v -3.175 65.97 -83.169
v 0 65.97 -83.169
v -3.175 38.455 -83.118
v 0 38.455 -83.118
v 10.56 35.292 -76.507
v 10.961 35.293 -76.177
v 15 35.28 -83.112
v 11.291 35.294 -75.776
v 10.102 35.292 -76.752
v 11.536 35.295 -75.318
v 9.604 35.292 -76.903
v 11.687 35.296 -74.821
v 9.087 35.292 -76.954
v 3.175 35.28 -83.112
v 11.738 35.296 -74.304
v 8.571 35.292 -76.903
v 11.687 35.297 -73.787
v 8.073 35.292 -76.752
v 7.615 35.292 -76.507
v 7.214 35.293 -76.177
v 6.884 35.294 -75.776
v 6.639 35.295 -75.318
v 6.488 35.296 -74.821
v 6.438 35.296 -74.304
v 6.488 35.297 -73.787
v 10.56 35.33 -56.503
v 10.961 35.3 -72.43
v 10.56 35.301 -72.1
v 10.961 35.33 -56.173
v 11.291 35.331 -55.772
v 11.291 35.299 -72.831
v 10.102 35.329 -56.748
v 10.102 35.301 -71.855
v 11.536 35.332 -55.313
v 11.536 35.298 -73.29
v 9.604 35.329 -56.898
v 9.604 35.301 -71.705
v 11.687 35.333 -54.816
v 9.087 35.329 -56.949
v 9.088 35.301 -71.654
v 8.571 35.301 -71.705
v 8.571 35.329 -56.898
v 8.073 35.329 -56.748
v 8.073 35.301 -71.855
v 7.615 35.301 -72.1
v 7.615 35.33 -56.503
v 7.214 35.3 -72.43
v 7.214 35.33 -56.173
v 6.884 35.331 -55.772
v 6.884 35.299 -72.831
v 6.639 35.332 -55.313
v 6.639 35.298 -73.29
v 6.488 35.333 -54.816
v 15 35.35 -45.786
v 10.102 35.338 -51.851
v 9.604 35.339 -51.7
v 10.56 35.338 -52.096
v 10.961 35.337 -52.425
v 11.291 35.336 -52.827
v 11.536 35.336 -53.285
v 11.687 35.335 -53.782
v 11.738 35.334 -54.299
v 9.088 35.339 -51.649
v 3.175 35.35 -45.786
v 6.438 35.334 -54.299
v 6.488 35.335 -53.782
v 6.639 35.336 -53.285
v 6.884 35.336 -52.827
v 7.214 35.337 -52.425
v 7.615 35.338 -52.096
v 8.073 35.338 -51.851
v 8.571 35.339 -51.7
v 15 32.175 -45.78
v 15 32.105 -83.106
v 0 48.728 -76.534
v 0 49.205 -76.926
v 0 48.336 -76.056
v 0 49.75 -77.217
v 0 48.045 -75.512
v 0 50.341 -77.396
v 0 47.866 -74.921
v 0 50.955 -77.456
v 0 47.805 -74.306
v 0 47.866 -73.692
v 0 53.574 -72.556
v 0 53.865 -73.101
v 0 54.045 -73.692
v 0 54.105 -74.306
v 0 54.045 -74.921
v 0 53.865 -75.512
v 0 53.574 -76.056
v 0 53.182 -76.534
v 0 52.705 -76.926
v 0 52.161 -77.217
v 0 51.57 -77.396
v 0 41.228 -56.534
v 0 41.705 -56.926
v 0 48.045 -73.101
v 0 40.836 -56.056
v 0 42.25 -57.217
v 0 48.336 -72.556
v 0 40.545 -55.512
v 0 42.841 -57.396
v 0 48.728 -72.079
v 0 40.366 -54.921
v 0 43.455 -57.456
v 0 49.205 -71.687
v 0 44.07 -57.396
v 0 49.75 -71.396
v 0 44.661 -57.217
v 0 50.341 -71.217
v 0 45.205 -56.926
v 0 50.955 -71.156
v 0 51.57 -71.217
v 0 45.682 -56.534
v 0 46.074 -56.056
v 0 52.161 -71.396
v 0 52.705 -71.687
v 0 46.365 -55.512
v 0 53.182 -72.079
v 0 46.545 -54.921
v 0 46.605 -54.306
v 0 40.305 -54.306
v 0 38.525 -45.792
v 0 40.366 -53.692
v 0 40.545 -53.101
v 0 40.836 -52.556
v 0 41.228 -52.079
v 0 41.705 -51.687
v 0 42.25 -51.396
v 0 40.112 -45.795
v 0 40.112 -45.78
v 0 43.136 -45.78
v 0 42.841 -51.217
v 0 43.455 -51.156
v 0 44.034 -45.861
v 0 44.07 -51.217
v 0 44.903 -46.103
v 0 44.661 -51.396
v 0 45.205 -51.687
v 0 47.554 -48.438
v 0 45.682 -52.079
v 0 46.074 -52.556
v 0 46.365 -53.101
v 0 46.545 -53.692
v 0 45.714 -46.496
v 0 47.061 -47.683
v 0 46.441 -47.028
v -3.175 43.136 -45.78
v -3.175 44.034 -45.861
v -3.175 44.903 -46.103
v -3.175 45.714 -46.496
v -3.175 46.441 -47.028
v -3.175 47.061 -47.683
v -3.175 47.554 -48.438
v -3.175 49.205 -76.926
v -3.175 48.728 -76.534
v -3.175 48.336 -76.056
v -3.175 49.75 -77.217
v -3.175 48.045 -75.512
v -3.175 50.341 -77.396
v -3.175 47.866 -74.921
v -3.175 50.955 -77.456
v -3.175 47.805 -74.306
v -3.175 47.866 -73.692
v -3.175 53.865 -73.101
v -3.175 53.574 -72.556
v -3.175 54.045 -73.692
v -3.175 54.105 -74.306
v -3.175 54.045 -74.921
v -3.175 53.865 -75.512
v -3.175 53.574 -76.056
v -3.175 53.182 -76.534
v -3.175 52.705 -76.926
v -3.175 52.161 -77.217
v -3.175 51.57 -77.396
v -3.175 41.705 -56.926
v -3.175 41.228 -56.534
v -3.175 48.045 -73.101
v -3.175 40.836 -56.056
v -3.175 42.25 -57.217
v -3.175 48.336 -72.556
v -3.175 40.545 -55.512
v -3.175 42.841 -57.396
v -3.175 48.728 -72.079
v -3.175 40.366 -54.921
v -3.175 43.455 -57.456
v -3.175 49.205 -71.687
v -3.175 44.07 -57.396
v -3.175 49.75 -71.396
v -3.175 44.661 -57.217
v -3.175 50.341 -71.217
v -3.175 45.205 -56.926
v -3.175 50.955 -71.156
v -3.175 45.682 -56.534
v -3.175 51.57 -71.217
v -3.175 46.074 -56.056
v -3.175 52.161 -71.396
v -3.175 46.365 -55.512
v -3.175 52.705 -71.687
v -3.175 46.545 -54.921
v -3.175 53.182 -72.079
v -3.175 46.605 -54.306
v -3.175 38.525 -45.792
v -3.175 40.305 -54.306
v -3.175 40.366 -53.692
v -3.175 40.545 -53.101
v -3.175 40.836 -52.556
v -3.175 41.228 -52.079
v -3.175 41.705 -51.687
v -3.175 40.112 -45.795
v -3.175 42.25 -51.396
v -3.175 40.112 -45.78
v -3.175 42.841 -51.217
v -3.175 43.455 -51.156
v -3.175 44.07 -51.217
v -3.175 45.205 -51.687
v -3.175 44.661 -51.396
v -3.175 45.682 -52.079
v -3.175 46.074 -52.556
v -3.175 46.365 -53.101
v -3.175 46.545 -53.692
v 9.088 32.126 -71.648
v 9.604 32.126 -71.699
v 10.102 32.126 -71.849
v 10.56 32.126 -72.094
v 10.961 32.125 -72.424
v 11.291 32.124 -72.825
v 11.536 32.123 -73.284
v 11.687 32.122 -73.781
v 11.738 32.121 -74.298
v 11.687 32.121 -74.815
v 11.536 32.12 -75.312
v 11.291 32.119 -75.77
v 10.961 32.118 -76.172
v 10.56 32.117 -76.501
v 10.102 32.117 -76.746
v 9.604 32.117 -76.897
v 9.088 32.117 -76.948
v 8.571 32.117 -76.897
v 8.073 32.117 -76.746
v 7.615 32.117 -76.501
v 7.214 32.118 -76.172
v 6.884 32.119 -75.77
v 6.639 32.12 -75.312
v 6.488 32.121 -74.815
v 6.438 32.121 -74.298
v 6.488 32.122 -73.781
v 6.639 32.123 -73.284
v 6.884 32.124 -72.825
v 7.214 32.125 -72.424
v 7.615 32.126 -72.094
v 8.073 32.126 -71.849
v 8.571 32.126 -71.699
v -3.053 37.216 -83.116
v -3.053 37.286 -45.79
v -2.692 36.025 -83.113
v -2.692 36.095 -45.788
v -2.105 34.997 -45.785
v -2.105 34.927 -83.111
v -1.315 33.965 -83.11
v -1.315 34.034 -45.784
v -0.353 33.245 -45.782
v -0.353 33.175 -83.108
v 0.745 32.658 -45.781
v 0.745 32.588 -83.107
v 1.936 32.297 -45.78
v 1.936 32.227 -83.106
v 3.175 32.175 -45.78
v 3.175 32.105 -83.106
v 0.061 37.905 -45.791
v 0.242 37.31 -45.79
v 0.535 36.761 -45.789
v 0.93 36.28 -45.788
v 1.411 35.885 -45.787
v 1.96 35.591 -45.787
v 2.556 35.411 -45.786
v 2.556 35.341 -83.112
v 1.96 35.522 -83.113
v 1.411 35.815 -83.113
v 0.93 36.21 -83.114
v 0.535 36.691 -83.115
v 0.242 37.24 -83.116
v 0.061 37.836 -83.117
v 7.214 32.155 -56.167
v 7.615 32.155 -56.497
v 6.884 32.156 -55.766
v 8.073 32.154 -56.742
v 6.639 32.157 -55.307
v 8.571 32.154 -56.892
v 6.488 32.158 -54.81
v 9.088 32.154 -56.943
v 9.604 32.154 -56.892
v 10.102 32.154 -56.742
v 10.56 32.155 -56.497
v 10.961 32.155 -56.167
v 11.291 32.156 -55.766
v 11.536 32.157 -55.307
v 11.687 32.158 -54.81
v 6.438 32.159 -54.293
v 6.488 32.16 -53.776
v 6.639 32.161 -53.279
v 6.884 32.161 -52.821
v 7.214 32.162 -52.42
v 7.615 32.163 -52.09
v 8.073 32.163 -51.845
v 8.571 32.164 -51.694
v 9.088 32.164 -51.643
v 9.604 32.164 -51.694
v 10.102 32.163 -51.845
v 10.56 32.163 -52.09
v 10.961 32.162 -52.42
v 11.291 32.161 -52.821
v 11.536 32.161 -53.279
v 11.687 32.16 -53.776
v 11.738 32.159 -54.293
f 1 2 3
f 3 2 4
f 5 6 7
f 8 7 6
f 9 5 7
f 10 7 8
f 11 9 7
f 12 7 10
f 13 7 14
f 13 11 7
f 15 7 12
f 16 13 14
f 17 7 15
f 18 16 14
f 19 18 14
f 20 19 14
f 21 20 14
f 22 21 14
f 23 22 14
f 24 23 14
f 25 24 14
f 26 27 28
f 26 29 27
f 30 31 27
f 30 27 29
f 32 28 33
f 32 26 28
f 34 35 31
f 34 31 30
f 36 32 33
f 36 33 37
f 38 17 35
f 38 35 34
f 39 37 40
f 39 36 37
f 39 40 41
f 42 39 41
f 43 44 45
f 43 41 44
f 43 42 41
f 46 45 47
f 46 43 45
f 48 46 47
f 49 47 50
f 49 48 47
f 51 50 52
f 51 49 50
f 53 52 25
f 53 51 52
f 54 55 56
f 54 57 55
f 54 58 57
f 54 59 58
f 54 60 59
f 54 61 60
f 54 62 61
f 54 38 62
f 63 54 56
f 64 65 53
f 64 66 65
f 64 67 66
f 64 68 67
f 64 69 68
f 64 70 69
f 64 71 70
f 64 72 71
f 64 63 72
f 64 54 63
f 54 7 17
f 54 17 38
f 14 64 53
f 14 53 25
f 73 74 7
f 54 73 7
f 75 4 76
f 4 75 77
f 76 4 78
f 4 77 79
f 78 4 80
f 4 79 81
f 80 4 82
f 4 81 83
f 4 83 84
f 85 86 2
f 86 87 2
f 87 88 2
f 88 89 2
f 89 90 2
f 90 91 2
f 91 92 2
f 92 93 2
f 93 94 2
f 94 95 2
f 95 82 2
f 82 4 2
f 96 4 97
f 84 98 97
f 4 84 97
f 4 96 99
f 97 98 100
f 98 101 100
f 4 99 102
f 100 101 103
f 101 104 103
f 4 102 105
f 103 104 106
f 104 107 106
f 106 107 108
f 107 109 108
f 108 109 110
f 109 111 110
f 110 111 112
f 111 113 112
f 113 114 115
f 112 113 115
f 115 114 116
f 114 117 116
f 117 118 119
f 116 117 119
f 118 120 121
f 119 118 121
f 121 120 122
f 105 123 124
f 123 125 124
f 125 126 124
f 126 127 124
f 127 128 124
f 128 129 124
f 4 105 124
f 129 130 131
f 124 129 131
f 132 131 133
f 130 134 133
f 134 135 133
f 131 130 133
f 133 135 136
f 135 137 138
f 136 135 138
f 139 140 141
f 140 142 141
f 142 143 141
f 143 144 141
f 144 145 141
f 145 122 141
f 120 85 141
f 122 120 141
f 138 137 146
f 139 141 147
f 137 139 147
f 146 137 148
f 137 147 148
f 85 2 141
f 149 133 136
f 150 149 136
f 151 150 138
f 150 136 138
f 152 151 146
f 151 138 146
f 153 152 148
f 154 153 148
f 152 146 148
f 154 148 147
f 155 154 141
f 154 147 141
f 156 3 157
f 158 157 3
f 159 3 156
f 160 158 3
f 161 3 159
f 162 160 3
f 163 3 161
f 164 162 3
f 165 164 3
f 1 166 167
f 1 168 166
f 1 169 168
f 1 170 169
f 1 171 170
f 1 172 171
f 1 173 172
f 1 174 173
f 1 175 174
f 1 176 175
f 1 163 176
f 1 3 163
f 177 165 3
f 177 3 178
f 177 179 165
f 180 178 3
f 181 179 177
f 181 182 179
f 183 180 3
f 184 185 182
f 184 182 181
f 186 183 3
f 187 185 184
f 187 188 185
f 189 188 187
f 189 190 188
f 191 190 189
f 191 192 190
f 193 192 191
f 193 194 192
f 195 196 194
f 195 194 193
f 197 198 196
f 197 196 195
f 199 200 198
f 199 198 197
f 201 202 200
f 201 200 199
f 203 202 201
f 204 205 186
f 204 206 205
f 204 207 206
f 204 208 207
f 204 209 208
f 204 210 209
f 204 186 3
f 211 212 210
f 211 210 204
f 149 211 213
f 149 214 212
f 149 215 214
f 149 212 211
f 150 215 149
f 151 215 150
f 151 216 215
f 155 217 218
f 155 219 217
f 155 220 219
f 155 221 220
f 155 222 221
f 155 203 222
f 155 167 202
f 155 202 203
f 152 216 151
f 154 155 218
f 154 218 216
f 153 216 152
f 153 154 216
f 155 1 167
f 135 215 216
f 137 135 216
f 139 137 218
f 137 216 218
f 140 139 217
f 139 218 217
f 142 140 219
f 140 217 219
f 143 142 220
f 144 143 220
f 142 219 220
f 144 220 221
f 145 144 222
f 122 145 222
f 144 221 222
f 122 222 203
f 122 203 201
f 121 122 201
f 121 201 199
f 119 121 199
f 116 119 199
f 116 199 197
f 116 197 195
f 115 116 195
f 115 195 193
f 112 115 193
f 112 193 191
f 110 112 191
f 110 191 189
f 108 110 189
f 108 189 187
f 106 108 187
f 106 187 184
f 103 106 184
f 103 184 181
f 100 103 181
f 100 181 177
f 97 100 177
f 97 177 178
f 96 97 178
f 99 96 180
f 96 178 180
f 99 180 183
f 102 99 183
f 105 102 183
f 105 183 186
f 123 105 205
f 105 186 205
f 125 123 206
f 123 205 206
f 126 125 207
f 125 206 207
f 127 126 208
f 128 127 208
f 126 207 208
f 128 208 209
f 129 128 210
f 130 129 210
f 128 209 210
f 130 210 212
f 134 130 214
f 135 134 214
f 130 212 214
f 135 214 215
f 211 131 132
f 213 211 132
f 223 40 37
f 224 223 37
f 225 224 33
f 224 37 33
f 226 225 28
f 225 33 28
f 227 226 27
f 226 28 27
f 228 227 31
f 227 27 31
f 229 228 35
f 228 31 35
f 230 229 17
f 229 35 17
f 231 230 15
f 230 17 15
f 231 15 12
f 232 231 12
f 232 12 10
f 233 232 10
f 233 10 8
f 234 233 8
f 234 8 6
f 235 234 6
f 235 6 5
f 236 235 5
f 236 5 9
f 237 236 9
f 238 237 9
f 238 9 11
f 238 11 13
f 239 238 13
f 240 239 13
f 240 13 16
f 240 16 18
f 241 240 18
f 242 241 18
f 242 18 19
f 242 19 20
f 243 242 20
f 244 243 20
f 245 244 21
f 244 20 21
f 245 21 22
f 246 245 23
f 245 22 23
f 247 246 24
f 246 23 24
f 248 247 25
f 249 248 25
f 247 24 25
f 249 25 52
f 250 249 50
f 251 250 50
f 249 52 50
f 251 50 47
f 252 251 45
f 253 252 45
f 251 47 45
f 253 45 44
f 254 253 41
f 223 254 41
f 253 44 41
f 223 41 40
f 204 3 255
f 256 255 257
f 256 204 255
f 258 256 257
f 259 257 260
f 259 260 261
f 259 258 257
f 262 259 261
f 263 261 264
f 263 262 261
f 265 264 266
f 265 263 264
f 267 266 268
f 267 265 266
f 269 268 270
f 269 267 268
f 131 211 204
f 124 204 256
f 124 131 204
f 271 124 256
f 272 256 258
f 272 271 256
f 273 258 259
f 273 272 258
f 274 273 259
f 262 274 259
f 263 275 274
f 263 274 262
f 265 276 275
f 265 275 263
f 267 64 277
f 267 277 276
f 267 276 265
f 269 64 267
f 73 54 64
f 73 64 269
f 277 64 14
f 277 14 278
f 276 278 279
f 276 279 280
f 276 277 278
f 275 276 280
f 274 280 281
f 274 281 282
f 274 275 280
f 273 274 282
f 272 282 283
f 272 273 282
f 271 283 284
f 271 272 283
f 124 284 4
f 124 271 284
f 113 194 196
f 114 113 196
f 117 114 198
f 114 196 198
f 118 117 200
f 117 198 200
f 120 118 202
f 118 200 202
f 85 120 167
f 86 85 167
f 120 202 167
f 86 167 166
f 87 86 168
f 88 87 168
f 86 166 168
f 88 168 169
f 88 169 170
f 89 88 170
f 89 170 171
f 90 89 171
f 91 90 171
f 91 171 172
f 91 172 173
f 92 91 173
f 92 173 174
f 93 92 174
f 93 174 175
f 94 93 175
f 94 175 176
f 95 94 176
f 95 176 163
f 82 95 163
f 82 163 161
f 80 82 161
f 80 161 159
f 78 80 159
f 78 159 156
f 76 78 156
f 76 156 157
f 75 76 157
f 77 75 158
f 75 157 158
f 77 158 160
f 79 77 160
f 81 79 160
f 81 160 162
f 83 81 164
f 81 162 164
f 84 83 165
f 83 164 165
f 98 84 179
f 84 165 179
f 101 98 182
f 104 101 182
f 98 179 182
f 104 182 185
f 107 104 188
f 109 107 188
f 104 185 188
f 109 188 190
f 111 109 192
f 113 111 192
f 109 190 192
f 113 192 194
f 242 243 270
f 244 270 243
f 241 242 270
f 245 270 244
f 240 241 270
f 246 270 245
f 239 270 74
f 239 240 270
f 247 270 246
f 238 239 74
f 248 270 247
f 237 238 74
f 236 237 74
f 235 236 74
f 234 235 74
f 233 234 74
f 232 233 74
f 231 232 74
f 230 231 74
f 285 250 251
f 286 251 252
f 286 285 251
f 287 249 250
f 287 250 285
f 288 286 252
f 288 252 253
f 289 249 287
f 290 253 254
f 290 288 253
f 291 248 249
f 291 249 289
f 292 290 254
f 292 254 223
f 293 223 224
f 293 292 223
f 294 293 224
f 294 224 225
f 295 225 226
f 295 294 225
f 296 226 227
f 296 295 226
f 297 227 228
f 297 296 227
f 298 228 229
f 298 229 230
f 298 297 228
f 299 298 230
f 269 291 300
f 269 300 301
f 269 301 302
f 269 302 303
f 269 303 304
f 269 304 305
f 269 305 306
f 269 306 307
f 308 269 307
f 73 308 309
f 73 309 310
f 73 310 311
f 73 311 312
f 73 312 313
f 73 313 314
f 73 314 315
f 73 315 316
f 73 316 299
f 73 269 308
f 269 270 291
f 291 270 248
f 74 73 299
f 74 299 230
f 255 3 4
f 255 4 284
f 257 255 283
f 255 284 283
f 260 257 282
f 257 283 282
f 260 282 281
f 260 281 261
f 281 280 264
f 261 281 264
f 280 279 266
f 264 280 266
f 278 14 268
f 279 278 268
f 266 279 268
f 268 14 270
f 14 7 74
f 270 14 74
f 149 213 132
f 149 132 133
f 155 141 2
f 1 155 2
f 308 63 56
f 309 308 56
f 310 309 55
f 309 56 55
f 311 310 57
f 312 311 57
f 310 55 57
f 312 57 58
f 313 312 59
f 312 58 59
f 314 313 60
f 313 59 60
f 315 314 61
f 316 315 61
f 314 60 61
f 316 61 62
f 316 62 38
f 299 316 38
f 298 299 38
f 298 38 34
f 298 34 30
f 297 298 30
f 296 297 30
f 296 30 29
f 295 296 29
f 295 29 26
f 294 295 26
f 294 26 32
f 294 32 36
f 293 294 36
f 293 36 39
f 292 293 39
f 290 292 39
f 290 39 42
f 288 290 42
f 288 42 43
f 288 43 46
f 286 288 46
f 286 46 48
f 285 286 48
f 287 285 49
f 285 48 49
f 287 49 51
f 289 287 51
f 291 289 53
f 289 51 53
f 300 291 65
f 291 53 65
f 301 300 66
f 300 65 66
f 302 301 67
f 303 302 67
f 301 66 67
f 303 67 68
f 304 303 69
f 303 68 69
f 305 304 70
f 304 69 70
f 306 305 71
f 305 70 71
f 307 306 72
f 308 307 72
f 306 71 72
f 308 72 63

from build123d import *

# Parameters (mm, degrees)
BASE_FLANGE1_DEPTH            = 3.175
EDGE_FLANGE1_STRIP_W          = 19.05
EDGE_FLANGE1_STRIP_H          = 3.175
EDGE_FLANGE1_STRIP_CUT_DEPTH  = 37.325997284
EDGE_FLANGE1_RELIEF_W         = 20.6375
EDGE_FLANGE1_RELIEF_H         = 1.5875
EDGE_FLANGE1_RELIEF_CUT_DEPTH = 3.175
EDGE_FLANGE1_DEPTH            = 37.325997284
SKETCH15_R                    = 2.65
CUT_EXTRUDE2_DEPTH            = 10
SKETCH19_R                    = 3.15
CUT_EXTRUDE4_DEPTH            = 10


# Sheet-metal steps are written as plain solids
with BuildPart() as part:
    # Sketch3 → Base-Flange1 (new body)
    with BuildSketch(Plane(origin=(0, 0, 0), x_dir=(0, 0, -1), z_dir=(1, 0, 0))):
        with BuildLine():
            Line((83.106142408, 32.105064535), (45.780209905, 32.174606262))
            Line((45.780209905, 32.174606262), (45.780209905, 43.136168925))
            ThreePointArc((45.780209905, 43.136168925), (46.495831721, 45.713784796), (48.437851335, 47.553561406))
            Line((48.437851335, 47.553561406), (83.169236275, 65.970162941))
            Line((83.169236275, 65.970162941), (83.106142408, 32.105064535))
        make_face()
    extrude(amount=-BASE_FLANGE1_DEPTH)

    # Edge-Flange1 strip (across the edge) → Edge-Flange1 strip cut (cut)
    with BuildSketch(Plane(origin=(0, 32.174606262, -45.780209905), x_dir=(3.4914813388431334e-15, 0.999998264444559, -0.001863090945206598), z_dir=(0, -0.001863090945206598, -0.999998264444559))):
        with Locations((-3.175, -1.5875)):
            Rectangle(EDGE_FLANGE1_STRIP_W, EDGE_FLANGE1_STRIP_H)
    extrude(amount=EDGE_FLANGE1_STRIP_CUT_DEPTH, mode=Mode.SUBTRACT)

    # Edge-Flange1 relief (on the sheet) → Edge-Flange1 relief cut (cut)
    with BuildSketch(Plane(origin=(0, 38.524595242, -45.792040532), x_dir=(6.982962677686267e-15, 0.999998264444559, -0.001863090945206598), z_dir=(1, 0, 0))):
        with Locations((-8.73125, 0.79375)):
            Rectangle(EDGE_FLANGE1_RELIEF_W, EDGE_FLANGE1_RELIEF_H)
    extrude(amount=-EDGE_FLANGE1_RELIEF_CUT_DEPTH, mode=Mode.SUBTRACT)

    # Edge-Flange1 section (across the edge) → Edge-Flange1 (add)
    with BuildSketch(Plane(origin=(0, 32.174606262, -45.780209905), x_dir=(3.4914813388431334e-15, 0.999998264444559, -0.001863090945206598), z_dir=(0, -0.001863090945206598, -0.999998264444559))):
        with BuildLine():
            Line((0, 3.175), (0, 15))
            Line((0, 15), (3.175, 15))
            Line((3.175, 15), (3.175, 3.175))
            ThreePointArc((3.175, 3.175), (4.10493597, 0.92993597), (6.35, 0))
            Line((6.35, 0), (6.35, -3.175))
            ThreePointArc((6.35, -3.175), (1.859871939, -1.315128061), (0, 3.175))
        make_face()
    extrude(amount=EDGE_FLANGE1_DEPTH)

    # Sketch15 → Cut-Extrude2 (cut)
    with BuildSketch(Plane(origin=(0, 35.434781617, -0.066018335), x_dir=(1, 0, 0), z_dir=(-3.23986857388729e-15, 0.999998264444559, -0.0018630909452065992))):
        with Locations(Location((9.0875, 74.237769892, 0), (0, 0, 270))):
            Circle(SKETCH15_R)
        with Locations(Location((9.0875, 54.233380341, 0), (0, 0, 270))):
            Circle(SKETCH15_R)
    extrude(amount=-CUT_EXTRUDE2_DEPTH, mode=Mode.SUBTRACT)

    # Sketch19 → Cut-Extrude4 (cut)
    with BuildSketch(Plane.ZY.offset(3.175)):
        with Locations((-54.306440614, 43.455053514)):
            Circle(SKETCH19_R)
        with Locations((-74.30640548, 50.955053514)):
            Circle(SKETCH19_R)
    extrude(amount=-CUT_EXTRUDE4_DEPTH, mode=Mode.SUBTRACT)


solid = part.part
